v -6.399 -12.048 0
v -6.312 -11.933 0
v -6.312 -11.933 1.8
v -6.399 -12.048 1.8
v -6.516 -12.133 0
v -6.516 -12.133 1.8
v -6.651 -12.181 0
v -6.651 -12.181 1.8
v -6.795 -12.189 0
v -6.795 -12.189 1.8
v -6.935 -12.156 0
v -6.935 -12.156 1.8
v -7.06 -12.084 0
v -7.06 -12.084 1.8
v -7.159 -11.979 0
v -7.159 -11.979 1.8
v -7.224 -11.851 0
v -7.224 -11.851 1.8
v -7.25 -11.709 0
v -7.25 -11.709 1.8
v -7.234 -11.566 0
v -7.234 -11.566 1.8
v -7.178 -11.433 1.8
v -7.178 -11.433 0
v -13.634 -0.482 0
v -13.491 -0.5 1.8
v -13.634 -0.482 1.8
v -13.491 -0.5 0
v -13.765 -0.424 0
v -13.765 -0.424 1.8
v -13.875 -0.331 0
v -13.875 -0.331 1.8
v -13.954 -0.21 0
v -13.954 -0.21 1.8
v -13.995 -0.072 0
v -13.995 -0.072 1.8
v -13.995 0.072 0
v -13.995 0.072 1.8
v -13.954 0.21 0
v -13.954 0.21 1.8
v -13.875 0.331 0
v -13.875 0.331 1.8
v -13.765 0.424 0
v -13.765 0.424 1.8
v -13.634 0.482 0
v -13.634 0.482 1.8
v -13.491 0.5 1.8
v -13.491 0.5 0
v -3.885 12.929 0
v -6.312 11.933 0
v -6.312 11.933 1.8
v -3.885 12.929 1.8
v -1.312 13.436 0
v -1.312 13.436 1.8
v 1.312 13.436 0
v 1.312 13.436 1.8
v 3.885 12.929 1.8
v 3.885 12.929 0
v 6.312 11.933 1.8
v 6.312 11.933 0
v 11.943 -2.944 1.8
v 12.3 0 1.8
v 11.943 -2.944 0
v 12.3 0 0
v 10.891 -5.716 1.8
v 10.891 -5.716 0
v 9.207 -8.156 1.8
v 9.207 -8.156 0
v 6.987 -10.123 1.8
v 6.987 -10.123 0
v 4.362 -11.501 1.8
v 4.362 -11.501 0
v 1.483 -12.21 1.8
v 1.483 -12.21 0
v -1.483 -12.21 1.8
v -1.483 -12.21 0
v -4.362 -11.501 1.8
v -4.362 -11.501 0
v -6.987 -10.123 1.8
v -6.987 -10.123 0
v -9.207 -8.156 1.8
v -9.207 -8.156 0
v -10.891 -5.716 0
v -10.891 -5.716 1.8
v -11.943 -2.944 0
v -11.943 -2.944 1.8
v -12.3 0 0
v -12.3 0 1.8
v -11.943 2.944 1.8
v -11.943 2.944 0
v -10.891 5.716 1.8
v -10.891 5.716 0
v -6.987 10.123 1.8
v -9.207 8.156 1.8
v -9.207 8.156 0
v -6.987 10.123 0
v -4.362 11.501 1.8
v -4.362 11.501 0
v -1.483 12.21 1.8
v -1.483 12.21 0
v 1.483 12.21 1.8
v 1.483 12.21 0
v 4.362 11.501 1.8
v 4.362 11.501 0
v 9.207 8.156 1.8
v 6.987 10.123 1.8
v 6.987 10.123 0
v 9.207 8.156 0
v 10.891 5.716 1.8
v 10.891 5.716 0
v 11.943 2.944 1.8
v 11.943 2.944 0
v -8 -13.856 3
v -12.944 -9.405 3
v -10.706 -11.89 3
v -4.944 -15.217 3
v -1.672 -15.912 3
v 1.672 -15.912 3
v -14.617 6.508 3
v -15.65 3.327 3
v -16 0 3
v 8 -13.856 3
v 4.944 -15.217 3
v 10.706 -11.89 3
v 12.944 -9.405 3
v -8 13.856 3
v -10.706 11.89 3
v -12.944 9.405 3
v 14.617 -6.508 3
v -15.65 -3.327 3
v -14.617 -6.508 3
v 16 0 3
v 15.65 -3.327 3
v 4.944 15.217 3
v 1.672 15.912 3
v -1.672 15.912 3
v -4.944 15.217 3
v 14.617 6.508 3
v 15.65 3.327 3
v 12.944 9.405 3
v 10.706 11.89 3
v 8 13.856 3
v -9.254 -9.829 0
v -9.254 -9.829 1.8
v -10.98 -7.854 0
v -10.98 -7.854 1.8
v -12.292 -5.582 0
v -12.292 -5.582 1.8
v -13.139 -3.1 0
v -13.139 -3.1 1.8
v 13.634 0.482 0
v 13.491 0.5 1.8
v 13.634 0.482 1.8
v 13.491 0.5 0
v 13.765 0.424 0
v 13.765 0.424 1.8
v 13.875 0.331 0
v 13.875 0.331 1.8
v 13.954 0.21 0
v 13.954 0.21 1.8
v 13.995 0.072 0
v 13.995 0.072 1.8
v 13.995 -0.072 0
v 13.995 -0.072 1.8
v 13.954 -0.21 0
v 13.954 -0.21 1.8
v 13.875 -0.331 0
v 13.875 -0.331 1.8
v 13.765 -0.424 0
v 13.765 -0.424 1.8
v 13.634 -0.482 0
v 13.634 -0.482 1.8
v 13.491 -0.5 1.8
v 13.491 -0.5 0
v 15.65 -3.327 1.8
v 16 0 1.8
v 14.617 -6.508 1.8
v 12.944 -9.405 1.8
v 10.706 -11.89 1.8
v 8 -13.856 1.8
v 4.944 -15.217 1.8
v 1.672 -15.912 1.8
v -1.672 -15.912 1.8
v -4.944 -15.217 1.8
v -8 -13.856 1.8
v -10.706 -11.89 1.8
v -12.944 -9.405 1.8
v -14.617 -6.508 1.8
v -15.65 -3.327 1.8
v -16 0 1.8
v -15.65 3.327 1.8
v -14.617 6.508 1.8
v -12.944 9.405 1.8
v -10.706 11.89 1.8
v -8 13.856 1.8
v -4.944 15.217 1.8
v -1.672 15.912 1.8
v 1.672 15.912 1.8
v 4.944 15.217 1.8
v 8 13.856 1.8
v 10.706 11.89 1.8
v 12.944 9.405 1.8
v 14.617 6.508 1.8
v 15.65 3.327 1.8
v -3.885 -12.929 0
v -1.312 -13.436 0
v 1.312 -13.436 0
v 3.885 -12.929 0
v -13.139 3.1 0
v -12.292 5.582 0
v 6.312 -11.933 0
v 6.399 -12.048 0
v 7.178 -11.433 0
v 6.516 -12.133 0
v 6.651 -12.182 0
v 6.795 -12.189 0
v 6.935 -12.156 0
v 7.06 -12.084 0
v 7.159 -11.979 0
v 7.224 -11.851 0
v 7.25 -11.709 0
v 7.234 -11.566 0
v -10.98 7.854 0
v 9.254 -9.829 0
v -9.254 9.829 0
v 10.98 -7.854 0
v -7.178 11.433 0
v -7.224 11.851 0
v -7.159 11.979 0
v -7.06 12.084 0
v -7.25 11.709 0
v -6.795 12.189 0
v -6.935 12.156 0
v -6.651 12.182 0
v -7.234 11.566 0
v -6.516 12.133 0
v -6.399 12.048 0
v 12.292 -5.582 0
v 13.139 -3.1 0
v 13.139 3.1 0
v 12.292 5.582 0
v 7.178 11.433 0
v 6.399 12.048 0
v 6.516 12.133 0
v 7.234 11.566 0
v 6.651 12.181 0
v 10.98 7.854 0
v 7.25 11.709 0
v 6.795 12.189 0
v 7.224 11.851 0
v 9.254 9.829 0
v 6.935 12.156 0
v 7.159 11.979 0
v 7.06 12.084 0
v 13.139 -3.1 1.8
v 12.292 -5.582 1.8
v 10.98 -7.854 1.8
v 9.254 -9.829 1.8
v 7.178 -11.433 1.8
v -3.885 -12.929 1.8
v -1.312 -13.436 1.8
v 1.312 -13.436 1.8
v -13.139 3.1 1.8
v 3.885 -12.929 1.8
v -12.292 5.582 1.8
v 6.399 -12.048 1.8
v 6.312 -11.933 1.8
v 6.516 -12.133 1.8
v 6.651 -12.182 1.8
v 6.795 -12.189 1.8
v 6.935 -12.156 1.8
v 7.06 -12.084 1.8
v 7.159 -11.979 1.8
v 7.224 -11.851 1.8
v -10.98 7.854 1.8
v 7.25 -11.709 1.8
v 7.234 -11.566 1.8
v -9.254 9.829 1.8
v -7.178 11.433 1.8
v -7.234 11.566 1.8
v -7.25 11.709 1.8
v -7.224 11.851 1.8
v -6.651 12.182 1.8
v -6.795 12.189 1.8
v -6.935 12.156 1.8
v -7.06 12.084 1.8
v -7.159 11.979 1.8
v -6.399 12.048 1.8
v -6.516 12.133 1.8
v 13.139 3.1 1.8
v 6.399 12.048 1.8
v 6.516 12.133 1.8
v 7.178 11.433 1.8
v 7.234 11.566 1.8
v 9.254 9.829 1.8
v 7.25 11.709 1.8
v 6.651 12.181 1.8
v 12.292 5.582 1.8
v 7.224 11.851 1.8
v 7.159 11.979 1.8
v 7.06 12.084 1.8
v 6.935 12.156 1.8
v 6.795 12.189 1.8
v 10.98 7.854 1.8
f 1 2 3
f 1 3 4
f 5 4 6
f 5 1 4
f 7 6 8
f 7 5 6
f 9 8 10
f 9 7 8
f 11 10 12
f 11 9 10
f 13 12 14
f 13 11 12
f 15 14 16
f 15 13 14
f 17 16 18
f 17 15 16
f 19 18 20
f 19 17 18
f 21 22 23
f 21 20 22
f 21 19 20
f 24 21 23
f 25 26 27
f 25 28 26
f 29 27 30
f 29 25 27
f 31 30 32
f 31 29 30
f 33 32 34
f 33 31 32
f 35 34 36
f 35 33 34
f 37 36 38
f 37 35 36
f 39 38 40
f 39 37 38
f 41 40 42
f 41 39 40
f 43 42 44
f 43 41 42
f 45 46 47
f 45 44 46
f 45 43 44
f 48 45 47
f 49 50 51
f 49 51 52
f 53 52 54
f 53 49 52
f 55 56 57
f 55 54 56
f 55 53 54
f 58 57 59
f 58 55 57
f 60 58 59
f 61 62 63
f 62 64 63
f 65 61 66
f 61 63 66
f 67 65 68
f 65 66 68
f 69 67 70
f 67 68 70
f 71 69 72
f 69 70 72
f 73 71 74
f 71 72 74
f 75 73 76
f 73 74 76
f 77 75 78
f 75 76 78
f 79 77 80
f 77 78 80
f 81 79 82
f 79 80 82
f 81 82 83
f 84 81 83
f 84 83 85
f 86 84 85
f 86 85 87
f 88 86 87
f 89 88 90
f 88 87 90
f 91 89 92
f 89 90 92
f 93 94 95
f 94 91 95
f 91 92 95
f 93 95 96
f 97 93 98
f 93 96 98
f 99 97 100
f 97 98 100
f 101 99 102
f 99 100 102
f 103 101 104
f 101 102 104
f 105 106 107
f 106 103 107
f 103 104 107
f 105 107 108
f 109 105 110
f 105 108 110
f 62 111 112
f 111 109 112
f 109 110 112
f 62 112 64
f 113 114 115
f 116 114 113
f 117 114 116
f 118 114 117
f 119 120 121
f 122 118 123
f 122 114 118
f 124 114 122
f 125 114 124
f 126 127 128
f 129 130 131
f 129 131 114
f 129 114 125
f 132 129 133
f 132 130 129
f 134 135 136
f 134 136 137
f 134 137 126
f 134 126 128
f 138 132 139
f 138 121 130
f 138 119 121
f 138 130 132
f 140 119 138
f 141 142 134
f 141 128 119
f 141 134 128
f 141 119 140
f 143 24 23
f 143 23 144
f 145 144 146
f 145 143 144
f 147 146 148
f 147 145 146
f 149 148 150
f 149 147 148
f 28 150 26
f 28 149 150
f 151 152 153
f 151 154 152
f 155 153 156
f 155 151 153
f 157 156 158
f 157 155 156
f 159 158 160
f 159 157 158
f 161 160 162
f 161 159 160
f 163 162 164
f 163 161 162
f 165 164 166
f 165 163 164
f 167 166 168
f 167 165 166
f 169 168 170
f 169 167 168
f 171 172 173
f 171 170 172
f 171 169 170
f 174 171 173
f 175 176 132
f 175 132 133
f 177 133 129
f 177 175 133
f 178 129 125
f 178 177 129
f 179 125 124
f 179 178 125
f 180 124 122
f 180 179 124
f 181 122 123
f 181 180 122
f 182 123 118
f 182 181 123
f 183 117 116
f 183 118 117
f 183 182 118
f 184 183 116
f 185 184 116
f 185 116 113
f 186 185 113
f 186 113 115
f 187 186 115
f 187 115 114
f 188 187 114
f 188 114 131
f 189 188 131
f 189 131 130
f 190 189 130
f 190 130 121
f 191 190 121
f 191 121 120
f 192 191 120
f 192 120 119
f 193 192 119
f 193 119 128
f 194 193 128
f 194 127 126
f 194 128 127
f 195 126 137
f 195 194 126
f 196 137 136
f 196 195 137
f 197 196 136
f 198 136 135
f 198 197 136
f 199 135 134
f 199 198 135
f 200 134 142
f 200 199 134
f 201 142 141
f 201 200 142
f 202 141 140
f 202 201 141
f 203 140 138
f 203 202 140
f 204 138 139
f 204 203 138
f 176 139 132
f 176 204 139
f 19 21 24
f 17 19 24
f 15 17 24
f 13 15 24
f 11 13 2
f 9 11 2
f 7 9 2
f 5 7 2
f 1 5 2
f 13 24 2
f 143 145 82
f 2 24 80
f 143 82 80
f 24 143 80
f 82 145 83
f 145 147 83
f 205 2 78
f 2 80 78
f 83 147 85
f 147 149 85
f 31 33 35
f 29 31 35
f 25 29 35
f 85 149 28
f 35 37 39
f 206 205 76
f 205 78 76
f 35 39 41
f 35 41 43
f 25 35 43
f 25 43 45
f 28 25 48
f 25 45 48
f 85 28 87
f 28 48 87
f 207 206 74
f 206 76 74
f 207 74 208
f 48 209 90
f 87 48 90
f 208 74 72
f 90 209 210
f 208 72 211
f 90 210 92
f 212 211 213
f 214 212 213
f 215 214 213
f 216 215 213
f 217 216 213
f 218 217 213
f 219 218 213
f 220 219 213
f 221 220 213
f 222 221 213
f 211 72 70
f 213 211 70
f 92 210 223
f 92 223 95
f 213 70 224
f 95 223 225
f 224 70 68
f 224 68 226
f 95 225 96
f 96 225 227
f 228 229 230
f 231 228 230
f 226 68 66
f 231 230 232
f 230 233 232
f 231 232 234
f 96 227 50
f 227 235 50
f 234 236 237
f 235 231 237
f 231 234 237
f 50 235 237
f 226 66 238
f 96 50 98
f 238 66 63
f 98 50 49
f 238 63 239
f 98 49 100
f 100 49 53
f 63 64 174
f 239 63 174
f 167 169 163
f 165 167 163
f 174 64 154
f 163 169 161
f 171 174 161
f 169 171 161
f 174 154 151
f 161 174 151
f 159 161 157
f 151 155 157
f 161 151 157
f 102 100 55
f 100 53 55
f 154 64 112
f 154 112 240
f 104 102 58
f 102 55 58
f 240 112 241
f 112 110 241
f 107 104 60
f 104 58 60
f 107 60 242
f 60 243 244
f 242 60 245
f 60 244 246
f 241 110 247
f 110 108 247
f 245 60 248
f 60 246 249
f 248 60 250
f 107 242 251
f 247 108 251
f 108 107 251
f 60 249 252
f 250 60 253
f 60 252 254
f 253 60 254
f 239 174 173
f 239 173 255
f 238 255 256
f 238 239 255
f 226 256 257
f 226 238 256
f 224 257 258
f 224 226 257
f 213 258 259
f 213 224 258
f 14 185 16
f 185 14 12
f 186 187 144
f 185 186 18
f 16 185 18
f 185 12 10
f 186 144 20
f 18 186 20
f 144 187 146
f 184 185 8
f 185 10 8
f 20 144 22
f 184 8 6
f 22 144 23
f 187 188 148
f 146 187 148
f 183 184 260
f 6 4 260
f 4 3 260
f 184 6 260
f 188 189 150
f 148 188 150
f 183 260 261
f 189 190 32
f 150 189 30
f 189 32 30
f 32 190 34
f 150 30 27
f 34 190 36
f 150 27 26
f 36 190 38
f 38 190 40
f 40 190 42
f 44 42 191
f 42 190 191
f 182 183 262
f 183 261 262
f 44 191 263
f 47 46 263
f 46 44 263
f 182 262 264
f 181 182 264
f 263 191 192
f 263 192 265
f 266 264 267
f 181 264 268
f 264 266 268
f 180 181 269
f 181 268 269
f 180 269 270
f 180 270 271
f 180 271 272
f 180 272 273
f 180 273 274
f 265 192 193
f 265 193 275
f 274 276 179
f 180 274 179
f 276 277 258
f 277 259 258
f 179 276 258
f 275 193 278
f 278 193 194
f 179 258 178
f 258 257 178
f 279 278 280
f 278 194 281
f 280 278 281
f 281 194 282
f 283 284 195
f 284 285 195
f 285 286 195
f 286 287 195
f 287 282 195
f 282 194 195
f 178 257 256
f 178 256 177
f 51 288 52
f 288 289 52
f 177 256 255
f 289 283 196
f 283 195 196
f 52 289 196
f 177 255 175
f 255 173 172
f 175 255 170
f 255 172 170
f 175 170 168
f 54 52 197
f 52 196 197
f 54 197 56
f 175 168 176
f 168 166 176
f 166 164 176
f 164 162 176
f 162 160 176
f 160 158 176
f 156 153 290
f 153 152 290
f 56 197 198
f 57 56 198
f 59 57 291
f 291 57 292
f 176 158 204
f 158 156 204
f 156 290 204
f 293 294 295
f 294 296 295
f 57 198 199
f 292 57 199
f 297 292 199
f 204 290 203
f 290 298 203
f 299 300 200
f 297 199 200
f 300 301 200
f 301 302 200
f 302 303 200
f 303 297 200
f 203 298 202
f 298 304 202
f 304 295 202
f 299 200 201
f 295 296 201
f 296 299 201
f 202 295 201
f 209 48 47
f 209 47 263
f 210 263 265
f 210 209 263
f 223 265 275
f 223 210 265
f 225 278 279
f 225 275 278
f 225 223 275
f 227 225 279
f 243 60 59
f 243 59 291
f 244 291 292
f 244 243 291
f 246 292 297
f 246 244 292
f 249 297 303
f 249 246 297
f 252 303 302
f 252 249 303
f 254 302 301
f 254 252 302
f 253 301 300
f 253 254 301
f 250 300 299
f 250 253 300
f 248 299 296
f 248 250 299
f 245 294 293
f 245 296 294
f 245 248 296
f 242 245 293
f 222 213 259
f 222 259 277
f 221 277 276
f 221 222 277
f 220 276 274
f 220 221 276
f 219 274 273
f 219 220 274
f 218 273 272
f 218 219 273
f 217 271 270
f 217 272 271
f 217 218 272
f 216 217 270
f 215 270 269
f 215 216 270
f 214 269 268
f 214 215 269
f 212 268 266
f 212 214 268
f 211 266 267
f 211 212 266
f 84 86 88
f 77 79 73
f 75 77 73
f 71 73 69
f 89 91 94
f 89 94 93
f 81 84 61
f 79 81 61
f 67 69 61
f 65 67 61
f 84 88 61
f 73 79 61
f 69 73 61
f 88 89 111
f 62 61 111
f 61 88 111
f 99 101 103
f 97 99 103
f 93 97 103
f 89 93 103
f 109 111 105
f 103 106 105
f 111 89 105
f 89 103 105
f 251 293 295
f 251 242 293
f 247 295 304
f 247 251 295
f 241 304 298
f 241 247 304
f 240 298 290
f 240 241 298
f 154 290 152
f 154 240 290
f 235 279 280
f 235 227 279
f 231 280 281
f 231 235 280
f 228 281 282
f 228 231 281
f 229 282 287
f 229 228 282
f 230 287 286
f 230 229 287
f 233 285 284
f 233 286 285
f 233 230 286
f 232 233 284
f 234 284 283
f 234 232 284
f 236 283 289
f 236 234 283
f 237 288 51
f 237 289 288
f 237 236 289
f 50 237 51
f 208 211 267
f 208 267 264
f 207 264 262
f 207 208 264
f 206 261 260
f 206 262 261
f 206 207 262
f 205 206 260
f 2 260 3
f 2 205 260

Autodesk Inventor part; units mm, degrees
ref_plane "YZ Plane" through (0, 0, 0) normal (1, 0, 0) x (0, 1, 0)
ref_plane "XZ Plane" through (0, 0, 0) normal (0, 1, 0) x (-1, 0, 0)
ref_plane "XY Plane" through (0, 0, 0) normal (0, 0, 1) x (1, 0, 0)
sketch "Skizze1" plane through (0, 0, 0) normal (0, 0, 1) x (1, 0, 0)
  circle A0 centre (0, 0) radius 12.3
  arc A1 (13.4907, -0.4999) -> (13.4907, 0.4999) centre (13.5, 0) ccw
  arc A2 (-13.4907, -0.4999) -> (13.4907, -0.4999) centre (0, 0) ccw
  line L0 (0, -18.9) -> (0, 18.9) construction
  line L1 (-20.7866, 0) -> (20.7866, 0) construction
  arc A3 (7.1783, 11.4334) -> (6.3124, 11.9333) centre (6.75, 11.6913) ccw
  arc A4 (-6.3124, 11.9333) -> (-7.1783, 11.4334) centre (-6.75, 11.6913) ccw
  arc A5 (-13.4907, 0.4999) -> (-13.4907, -0.4999) centre (-13.5, 0) ccw
  arc A6 (-7.1783, -11.4334) -> (-6.3124, -11.9333) centre (-6.75, -11.6913) ccw
  arc A7 (6.3124, -11.9333) -> (7.1783, -11.4334) centre (6.75, -11.6913) ccw
  arc A8 (13.4907, 0.4999) -> (7.1783, 11.4334) centre (0, 0) ccw
  arc A9 (6.3124, 11.9333) -> (-6.3124, 11.9333) centre (0, 0) ccw
  arc A10 (-7.1783, 11.4334) -> (-13.4907, 0.4999) centre (0, 0) ccw
  point P0 (-13.4907, -0.4999)
  point P1 (-6.3124, -11.9333)
  dimension "d3" = 0
  dimension "d7" = 1
  dimension "d9" = 13.5
  dimension "d10" = 24.6
  dimension "d11" = 13.5
  dimension "d12" = 0
  dimension "d13" = 13.4907
  dimension "d14" = 13.4907
  dimension "d69" = 360
extrude "Extrusion1" add sketch "Skizze1" along normal blind 1.8
sketch "Skizze2" plane through (0, 0, 1.8) normal (0, 0, 1) x (1, 0, 0)
  circle A0 centre (0, 0) radius 16
  dimension "d15" = 32
extrude "Extrusion2" add sketch "Skizze2" along normal blind 1.2
properties part number "Lid_plain" material "PC/ABS-Kunststoff"
